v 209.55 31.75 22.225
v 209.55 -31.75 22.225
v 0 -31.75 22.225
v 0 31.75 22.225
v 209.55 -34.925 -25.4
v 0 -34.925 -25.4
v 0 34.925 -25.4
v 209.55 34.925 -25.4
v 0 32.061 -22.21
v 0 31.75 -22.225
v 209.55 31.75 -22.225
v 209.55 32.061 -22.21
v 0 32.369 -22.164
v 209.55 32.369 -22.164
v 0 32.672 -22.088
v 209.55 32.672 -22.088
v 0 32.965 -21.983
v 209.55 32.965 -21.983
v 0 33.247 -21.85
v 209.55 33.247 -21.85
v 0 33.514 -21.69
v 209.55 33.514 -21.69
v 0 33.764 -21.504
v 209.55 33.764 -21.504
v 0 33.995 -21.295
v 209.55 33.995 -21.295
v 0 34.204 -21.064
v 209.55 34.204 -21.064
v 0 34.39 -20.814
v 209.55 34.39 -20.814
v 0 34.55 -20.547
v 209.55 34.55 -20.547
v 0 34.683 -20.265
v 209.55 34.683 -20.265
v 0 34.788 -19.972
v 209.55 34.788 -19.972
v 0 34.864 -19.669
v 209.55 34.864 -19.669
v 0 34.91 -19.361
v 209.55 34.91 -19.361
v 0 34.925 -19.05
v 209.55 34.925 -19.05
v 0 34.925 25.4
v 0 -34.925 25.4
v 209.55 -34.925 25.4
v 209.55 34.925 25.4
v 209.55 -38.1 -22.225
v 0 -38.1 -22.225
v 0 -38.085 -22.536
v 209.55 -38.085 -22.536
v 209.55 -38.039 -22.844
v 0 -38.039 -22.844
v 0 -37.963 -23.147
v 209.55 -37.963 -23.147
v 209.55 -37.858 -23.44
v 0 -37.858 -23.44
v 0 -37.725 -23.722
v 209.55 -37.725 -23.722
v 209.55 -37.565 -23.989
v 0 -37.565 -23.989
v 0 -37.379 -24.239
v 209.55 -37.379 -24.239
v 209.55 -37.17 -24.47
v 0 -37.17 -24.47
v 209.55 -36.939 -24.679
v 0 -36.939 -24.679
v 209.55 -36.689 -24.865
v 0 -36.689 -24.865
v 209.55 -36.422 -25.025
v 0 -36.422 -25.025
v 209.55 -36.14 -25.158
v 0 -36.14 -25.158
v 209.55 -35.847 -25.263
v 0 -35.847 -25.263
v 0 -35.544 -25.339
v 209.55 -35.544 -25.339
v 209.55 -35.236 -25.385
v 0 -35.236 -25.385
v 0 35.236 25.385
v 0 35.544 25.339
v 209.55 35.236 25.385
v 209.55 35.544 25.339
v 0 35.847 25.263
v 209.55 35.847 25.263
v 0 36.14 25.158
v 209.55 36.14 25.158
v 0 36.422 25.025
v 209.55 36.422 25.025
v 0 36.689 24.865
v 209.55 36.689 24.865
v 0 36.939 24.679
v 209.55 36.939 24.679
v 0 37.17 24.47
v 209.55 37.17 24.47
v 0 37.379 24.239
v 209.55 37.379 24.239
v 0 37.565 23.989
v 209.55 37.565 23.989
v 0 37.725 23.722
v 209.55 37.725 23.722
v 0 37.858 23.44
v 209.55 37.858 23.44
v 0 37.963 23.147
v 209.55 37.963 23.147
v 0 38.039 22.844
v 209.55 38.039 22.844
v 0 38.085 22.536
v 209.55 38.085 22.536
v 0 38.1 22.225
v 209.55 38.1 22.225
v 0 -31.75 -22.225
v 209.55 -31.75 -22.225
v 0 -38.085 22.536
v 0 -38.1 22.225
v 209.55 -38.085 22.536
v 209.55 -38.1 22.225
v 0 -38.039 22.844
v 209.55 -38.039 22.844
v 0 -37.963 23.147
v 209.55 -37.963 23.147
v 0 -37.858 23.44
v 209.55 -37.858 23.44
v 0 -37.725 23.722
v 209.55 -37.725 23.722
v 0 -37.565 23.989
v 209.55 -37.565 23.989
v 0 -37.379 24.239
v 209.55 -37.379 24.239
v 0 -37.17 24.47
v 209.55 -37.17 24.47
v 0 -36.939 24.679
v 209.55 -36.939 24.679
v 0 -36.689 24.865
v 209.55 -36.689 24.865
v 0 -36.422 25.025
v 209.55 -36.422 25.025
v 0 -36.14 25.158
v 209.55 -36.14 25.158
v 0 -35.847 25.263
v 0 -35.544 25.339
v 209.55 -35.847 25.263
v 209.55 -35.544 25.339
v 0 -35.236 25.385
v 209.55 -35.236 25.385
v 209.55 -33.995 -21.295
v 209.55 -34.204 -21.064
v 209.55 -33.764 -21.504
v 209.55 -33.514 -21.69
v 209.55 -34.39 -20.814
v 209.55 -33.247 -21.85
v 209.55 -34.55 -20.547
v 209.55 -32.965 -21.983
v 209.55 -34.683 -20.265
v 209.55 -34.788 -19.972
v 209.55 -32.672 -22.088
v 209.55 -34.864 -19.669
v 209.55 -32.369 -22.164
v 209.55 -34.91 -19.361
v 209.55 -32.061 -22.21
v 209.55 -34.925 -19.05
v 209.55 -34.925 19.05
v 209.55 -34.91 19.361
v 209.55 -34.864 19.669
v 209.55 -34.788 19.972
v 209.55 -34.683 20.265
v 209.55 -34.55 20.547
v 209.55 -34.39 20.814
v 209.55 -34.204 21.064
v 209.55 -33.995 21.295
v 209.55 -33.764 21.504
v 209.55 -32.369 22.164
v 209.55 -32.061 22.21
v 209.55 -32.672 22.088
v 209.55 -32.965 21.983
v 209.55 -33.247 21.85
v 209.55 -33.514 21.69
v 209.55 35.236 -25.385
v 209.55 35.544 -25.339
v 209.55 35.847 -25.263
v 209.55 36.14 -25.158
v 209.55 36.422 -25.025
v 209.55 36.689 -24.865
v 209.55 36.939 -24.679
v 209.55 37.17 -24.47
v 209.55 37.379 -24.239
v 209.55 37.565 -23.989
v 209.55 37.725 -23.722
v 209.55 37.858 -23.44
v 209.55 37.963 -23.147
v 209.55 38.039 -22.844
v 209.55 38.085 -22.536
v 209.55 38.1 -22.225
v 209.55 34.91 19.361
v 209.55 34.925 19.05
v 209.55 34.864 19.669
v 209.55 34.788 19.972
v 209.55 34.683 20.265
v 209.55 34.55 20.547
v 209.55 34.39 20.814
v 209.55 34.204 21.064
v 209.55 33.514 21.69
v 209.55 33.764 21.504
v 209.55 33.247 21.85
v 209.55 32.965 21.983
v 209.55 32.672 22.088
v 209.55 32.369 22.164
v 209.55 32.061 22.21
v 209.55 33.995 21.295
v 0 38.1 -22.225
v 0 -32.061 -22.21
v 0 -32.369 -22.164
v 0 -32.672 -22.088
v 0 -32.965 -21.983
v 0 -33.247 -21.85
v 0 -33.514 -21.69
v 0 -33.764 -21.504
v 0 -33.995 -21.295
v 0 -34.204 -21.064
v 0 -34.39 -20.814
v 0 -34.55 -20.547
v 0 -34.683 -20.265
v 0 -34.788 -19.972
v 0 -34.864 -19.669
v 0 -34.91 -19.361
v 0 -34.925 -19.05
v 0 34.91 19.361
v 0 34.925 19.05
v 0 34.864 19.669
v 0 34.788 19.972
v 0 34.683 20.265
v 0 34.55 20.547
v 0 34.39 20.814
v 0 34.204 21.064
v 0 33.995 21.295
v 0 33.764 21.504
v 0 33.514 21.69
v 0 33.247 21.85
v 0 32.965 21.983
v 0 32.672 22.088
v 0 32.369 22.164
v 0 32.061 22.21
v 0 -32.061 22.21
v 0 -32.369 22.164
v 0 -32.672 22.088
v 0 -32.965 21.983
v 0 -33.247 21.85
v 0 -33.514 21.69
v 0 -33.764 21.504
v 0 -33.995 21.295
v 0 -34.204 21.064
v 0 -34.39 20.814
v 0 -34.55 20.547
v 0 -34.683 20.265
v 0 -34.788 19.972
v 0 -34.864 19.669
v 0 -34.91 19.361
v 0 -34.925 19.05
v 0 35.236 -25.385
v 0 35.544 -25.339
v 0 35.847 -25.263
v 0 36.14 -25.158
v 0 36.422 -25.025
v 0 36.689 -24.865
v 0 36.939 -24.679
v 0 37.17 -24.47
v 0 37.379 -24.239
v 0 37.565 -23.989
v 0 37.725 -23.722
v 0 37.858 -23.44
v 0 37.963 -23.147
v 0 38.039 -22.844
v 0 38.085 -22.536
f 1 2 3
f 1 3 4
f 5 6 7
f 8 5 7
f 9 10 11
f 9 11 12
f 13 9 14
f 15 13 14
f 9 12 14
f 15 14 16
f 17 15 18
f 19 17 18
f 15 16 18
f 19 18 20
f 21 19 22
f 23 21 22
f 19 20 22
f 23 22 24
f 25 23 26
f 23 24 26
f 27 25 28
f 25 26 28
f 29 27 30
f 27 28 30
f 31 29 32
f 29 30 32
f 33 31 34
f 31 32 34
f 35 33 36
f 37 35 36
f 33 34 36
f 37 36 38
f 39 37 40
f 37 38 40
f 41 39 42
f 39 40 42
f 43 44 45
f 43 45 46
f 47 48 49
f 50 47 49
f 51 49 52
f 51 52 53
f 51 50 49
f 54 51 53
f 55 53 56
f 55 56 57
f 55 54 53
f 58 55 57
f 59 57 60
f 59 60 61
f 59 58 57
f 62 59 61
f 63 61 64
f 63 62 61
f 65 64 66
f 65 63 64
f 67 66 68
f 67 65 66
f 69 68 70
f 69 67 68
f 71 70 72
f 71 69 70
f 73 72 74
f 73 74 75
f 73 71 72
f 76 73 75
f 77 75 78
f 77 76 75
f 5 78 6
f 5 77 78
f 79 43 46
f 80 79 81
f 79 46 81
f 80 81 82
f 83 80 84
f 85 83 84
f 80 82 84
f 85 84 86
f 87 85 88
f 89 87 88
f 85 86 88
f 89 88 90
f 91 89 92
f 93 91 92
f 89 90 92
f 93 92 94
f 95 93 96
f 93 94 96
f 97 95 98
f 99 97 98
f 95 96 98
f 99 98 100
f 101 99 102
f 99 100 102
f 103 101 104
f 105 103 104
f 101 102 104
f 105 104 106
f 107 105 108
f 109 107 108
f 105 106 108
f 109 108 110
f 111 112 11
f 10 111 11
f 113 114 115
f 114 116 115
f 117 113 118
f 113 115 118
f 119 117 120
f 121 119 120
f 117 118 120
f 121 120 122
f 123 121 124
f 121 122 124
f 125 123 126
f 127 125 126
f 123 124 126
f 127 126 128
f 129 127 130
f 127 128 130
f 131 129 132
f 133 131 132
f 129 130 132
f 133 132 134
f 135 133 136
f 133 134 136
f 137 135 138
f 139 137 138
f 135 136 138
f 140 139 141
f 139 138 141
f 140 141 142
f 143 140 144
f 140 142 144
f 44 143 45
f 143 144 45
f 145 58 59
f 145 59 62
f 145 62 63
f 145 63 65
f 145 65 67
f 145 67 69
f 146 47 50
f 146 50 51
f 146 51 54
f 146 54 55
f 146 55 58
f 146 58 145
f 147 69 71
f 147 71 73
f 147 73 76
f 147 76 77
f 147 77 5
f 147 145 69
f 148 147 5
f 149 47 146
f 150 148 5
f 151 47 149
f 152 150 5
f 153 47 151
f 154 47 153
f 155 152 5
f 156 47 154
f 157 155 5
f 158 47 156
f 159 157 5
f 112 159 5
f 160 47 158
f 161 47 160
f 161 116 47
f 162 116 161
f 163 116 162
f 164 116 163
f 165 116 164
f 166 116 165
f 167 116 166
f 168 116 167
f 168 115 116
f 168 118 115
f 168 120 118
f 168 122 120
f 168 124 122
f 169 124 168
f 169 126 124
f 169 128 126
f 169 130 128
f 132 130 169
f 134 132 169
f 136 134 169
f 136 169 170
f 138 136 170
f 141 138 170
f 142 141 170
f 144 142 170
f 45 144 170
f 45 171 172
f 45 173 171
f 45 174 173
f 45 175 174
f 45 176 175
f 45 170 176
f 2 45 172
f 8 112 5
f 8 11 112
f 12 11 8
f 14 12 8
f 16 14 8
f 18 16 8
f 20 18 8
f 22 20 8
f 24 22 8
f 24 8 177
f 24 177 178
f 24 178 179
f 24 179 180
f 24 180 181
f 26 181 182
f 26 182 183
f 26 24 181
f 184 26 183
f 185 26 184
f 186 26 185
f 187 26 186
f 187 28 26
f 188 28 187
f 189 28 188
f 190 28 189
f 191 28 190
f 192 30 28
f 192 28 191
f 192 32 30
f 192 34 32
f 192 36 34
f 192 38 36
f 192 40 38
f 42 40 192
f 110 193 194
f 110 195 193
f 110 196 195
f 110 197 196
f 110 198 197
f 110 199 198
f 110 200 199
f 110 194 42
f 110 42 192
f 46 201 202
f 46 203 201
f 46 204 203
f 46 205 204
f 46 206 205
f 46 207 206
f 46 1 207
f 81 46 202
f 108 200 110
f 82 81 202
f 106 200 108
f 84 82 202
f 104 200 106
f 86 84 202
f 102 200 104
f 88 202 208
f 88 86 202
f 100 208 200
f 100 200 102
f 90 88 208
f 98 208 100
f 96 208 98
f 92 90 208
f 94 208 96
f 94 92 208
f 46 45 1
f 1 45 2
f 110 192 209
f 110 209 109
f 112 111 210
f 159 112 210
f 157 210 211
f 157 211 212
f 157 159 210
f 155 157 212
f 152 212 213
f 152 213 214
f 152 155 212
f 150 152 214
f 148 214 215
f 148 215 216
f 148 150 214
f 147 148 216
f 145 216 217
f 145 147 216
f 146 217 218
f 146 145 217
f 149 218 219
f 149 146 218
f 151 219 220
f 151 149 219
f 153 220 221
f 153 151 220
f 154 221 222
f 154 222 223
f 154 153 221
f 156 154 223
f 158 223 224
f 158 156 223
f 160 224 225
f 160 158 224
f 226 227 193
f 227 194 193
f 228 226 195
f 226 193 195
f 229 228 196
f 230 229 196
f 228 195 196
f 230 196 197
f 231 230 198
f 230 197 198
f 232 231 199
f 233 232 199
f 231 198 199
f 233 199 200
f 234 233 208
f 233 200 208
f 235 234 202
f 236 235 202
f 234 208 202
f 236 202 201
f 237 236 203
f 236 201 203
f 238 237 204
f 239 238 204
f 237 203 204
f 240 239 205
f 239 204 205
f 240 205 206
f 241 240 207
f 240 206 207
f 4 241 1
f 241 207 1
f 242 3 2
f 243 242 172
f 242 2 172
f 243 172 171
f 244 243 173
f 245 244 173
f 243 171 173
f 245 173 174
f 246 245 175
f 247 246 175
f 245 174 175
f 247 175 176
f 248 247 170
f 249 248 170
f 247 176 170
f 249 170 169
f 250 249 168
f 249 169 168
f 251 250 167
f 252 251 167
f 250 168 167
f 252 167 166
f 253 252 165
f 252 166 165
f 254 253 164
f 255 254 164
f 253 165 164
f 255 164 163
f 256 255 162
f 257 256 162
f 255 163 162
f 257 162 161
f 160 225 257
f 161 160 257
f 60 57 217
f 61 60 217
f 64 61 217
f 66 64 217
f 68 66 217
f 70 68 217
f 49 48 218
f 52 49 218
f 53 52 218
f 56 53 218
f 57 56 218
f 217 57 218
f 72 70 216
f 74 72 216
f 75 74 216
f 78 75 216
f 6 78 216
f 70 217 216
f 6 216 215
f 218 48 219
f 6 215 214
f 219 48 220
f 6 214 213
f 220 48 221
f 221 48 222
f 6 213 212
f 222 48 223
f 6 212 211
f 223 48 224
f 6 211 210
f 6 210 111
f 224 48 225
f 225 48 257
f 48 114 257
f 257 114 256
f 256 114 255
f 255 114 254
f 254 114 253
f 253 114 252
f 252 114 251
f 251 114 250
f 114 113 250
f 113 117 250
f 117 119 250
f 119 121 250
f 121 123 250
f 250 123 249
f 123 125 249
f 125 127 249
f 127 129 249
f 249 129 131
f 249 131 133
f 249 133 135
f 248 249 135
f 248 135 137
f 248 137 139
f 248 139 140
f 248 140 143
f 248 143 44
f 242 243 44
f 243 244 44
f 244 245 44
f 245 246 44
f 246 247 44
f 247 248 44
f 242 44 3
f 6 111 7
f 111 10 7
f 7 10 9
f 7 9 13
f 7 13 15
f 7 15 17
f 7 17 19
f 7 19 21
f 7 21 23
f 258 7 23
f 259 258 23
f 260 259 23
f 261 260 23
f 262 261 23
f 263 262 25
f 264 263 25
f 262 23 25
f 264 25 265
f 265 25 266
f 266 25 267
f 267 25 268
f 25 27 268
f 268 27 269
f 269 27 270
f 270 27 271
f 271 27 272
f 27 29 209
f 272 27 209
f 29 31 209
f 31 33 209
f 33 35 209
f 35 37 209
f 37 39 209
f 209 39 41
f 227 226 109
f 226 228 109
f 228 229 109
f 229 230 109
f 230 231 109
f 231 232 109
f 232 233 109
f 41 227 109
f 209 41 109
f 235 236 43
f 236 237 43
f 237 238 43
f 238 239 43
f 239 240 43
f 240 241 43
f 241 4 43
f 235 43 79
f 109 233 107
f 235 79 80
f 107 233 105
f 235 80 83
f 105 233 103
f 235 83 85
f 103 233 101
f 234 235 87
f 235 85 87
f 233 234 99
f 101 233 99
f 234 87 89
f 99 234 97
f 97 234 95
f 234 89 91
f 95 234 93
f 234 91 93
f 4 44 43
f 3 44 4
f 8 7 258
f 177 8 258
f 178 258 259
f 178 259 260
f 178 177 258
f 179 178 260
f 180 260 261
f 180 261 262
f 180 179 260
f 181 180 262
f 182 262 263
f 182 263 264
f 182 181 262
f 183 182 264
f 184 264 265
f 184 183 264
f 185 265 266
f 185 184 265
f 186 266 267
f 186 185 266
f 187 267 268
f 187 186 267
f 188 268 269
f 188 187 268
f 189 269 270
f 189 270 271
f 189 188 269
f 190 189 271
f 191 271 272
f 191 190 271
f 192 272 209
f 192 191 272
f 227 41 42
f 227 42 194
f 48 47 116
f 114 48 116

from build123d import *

# Parameters (mm, degrees)
F0_W     = 76.2
F0_H     = 50.8
F0_W_2   = 69.85
F0_H_2   = 44.45
F2_DEPTH = 209.55
F3_R     = 3.175


# Not quite as in the source:
# - a variable given as a bare number and used for a length is read in inches; the dataset says mm whatever the document's units were


with BuildPart() as f2:
    # F0 (on Right) → F2 (new body)
    with BuildSketch(Plane.YZ):
        Rectangle(F0_W, F0_H)
        Rectangle(F0_W_2, F0_H_2, mode=Mode.SUBTRACT)
    extrude(amount=F2_DEPTH)

    # F3
    f3_edges = [f2.edges().sort_by_distance(p)[0] for p in [
        (104.775, 38.1, 25.4),
        (104.775, 38.1, -25.4),
        (104.775, -38.1, -25.4),
        (104.775, -38.1, 25.4),
        (104.775, 34.925, -22.225),
        (104.775, 34.925, 22.225),
        (104.775, -34.925, 22.225),
        (104.775, -34.925, -22.225),
    ]]
    fillet(f3_edges, radius=F3_R)


solid = f2.part
